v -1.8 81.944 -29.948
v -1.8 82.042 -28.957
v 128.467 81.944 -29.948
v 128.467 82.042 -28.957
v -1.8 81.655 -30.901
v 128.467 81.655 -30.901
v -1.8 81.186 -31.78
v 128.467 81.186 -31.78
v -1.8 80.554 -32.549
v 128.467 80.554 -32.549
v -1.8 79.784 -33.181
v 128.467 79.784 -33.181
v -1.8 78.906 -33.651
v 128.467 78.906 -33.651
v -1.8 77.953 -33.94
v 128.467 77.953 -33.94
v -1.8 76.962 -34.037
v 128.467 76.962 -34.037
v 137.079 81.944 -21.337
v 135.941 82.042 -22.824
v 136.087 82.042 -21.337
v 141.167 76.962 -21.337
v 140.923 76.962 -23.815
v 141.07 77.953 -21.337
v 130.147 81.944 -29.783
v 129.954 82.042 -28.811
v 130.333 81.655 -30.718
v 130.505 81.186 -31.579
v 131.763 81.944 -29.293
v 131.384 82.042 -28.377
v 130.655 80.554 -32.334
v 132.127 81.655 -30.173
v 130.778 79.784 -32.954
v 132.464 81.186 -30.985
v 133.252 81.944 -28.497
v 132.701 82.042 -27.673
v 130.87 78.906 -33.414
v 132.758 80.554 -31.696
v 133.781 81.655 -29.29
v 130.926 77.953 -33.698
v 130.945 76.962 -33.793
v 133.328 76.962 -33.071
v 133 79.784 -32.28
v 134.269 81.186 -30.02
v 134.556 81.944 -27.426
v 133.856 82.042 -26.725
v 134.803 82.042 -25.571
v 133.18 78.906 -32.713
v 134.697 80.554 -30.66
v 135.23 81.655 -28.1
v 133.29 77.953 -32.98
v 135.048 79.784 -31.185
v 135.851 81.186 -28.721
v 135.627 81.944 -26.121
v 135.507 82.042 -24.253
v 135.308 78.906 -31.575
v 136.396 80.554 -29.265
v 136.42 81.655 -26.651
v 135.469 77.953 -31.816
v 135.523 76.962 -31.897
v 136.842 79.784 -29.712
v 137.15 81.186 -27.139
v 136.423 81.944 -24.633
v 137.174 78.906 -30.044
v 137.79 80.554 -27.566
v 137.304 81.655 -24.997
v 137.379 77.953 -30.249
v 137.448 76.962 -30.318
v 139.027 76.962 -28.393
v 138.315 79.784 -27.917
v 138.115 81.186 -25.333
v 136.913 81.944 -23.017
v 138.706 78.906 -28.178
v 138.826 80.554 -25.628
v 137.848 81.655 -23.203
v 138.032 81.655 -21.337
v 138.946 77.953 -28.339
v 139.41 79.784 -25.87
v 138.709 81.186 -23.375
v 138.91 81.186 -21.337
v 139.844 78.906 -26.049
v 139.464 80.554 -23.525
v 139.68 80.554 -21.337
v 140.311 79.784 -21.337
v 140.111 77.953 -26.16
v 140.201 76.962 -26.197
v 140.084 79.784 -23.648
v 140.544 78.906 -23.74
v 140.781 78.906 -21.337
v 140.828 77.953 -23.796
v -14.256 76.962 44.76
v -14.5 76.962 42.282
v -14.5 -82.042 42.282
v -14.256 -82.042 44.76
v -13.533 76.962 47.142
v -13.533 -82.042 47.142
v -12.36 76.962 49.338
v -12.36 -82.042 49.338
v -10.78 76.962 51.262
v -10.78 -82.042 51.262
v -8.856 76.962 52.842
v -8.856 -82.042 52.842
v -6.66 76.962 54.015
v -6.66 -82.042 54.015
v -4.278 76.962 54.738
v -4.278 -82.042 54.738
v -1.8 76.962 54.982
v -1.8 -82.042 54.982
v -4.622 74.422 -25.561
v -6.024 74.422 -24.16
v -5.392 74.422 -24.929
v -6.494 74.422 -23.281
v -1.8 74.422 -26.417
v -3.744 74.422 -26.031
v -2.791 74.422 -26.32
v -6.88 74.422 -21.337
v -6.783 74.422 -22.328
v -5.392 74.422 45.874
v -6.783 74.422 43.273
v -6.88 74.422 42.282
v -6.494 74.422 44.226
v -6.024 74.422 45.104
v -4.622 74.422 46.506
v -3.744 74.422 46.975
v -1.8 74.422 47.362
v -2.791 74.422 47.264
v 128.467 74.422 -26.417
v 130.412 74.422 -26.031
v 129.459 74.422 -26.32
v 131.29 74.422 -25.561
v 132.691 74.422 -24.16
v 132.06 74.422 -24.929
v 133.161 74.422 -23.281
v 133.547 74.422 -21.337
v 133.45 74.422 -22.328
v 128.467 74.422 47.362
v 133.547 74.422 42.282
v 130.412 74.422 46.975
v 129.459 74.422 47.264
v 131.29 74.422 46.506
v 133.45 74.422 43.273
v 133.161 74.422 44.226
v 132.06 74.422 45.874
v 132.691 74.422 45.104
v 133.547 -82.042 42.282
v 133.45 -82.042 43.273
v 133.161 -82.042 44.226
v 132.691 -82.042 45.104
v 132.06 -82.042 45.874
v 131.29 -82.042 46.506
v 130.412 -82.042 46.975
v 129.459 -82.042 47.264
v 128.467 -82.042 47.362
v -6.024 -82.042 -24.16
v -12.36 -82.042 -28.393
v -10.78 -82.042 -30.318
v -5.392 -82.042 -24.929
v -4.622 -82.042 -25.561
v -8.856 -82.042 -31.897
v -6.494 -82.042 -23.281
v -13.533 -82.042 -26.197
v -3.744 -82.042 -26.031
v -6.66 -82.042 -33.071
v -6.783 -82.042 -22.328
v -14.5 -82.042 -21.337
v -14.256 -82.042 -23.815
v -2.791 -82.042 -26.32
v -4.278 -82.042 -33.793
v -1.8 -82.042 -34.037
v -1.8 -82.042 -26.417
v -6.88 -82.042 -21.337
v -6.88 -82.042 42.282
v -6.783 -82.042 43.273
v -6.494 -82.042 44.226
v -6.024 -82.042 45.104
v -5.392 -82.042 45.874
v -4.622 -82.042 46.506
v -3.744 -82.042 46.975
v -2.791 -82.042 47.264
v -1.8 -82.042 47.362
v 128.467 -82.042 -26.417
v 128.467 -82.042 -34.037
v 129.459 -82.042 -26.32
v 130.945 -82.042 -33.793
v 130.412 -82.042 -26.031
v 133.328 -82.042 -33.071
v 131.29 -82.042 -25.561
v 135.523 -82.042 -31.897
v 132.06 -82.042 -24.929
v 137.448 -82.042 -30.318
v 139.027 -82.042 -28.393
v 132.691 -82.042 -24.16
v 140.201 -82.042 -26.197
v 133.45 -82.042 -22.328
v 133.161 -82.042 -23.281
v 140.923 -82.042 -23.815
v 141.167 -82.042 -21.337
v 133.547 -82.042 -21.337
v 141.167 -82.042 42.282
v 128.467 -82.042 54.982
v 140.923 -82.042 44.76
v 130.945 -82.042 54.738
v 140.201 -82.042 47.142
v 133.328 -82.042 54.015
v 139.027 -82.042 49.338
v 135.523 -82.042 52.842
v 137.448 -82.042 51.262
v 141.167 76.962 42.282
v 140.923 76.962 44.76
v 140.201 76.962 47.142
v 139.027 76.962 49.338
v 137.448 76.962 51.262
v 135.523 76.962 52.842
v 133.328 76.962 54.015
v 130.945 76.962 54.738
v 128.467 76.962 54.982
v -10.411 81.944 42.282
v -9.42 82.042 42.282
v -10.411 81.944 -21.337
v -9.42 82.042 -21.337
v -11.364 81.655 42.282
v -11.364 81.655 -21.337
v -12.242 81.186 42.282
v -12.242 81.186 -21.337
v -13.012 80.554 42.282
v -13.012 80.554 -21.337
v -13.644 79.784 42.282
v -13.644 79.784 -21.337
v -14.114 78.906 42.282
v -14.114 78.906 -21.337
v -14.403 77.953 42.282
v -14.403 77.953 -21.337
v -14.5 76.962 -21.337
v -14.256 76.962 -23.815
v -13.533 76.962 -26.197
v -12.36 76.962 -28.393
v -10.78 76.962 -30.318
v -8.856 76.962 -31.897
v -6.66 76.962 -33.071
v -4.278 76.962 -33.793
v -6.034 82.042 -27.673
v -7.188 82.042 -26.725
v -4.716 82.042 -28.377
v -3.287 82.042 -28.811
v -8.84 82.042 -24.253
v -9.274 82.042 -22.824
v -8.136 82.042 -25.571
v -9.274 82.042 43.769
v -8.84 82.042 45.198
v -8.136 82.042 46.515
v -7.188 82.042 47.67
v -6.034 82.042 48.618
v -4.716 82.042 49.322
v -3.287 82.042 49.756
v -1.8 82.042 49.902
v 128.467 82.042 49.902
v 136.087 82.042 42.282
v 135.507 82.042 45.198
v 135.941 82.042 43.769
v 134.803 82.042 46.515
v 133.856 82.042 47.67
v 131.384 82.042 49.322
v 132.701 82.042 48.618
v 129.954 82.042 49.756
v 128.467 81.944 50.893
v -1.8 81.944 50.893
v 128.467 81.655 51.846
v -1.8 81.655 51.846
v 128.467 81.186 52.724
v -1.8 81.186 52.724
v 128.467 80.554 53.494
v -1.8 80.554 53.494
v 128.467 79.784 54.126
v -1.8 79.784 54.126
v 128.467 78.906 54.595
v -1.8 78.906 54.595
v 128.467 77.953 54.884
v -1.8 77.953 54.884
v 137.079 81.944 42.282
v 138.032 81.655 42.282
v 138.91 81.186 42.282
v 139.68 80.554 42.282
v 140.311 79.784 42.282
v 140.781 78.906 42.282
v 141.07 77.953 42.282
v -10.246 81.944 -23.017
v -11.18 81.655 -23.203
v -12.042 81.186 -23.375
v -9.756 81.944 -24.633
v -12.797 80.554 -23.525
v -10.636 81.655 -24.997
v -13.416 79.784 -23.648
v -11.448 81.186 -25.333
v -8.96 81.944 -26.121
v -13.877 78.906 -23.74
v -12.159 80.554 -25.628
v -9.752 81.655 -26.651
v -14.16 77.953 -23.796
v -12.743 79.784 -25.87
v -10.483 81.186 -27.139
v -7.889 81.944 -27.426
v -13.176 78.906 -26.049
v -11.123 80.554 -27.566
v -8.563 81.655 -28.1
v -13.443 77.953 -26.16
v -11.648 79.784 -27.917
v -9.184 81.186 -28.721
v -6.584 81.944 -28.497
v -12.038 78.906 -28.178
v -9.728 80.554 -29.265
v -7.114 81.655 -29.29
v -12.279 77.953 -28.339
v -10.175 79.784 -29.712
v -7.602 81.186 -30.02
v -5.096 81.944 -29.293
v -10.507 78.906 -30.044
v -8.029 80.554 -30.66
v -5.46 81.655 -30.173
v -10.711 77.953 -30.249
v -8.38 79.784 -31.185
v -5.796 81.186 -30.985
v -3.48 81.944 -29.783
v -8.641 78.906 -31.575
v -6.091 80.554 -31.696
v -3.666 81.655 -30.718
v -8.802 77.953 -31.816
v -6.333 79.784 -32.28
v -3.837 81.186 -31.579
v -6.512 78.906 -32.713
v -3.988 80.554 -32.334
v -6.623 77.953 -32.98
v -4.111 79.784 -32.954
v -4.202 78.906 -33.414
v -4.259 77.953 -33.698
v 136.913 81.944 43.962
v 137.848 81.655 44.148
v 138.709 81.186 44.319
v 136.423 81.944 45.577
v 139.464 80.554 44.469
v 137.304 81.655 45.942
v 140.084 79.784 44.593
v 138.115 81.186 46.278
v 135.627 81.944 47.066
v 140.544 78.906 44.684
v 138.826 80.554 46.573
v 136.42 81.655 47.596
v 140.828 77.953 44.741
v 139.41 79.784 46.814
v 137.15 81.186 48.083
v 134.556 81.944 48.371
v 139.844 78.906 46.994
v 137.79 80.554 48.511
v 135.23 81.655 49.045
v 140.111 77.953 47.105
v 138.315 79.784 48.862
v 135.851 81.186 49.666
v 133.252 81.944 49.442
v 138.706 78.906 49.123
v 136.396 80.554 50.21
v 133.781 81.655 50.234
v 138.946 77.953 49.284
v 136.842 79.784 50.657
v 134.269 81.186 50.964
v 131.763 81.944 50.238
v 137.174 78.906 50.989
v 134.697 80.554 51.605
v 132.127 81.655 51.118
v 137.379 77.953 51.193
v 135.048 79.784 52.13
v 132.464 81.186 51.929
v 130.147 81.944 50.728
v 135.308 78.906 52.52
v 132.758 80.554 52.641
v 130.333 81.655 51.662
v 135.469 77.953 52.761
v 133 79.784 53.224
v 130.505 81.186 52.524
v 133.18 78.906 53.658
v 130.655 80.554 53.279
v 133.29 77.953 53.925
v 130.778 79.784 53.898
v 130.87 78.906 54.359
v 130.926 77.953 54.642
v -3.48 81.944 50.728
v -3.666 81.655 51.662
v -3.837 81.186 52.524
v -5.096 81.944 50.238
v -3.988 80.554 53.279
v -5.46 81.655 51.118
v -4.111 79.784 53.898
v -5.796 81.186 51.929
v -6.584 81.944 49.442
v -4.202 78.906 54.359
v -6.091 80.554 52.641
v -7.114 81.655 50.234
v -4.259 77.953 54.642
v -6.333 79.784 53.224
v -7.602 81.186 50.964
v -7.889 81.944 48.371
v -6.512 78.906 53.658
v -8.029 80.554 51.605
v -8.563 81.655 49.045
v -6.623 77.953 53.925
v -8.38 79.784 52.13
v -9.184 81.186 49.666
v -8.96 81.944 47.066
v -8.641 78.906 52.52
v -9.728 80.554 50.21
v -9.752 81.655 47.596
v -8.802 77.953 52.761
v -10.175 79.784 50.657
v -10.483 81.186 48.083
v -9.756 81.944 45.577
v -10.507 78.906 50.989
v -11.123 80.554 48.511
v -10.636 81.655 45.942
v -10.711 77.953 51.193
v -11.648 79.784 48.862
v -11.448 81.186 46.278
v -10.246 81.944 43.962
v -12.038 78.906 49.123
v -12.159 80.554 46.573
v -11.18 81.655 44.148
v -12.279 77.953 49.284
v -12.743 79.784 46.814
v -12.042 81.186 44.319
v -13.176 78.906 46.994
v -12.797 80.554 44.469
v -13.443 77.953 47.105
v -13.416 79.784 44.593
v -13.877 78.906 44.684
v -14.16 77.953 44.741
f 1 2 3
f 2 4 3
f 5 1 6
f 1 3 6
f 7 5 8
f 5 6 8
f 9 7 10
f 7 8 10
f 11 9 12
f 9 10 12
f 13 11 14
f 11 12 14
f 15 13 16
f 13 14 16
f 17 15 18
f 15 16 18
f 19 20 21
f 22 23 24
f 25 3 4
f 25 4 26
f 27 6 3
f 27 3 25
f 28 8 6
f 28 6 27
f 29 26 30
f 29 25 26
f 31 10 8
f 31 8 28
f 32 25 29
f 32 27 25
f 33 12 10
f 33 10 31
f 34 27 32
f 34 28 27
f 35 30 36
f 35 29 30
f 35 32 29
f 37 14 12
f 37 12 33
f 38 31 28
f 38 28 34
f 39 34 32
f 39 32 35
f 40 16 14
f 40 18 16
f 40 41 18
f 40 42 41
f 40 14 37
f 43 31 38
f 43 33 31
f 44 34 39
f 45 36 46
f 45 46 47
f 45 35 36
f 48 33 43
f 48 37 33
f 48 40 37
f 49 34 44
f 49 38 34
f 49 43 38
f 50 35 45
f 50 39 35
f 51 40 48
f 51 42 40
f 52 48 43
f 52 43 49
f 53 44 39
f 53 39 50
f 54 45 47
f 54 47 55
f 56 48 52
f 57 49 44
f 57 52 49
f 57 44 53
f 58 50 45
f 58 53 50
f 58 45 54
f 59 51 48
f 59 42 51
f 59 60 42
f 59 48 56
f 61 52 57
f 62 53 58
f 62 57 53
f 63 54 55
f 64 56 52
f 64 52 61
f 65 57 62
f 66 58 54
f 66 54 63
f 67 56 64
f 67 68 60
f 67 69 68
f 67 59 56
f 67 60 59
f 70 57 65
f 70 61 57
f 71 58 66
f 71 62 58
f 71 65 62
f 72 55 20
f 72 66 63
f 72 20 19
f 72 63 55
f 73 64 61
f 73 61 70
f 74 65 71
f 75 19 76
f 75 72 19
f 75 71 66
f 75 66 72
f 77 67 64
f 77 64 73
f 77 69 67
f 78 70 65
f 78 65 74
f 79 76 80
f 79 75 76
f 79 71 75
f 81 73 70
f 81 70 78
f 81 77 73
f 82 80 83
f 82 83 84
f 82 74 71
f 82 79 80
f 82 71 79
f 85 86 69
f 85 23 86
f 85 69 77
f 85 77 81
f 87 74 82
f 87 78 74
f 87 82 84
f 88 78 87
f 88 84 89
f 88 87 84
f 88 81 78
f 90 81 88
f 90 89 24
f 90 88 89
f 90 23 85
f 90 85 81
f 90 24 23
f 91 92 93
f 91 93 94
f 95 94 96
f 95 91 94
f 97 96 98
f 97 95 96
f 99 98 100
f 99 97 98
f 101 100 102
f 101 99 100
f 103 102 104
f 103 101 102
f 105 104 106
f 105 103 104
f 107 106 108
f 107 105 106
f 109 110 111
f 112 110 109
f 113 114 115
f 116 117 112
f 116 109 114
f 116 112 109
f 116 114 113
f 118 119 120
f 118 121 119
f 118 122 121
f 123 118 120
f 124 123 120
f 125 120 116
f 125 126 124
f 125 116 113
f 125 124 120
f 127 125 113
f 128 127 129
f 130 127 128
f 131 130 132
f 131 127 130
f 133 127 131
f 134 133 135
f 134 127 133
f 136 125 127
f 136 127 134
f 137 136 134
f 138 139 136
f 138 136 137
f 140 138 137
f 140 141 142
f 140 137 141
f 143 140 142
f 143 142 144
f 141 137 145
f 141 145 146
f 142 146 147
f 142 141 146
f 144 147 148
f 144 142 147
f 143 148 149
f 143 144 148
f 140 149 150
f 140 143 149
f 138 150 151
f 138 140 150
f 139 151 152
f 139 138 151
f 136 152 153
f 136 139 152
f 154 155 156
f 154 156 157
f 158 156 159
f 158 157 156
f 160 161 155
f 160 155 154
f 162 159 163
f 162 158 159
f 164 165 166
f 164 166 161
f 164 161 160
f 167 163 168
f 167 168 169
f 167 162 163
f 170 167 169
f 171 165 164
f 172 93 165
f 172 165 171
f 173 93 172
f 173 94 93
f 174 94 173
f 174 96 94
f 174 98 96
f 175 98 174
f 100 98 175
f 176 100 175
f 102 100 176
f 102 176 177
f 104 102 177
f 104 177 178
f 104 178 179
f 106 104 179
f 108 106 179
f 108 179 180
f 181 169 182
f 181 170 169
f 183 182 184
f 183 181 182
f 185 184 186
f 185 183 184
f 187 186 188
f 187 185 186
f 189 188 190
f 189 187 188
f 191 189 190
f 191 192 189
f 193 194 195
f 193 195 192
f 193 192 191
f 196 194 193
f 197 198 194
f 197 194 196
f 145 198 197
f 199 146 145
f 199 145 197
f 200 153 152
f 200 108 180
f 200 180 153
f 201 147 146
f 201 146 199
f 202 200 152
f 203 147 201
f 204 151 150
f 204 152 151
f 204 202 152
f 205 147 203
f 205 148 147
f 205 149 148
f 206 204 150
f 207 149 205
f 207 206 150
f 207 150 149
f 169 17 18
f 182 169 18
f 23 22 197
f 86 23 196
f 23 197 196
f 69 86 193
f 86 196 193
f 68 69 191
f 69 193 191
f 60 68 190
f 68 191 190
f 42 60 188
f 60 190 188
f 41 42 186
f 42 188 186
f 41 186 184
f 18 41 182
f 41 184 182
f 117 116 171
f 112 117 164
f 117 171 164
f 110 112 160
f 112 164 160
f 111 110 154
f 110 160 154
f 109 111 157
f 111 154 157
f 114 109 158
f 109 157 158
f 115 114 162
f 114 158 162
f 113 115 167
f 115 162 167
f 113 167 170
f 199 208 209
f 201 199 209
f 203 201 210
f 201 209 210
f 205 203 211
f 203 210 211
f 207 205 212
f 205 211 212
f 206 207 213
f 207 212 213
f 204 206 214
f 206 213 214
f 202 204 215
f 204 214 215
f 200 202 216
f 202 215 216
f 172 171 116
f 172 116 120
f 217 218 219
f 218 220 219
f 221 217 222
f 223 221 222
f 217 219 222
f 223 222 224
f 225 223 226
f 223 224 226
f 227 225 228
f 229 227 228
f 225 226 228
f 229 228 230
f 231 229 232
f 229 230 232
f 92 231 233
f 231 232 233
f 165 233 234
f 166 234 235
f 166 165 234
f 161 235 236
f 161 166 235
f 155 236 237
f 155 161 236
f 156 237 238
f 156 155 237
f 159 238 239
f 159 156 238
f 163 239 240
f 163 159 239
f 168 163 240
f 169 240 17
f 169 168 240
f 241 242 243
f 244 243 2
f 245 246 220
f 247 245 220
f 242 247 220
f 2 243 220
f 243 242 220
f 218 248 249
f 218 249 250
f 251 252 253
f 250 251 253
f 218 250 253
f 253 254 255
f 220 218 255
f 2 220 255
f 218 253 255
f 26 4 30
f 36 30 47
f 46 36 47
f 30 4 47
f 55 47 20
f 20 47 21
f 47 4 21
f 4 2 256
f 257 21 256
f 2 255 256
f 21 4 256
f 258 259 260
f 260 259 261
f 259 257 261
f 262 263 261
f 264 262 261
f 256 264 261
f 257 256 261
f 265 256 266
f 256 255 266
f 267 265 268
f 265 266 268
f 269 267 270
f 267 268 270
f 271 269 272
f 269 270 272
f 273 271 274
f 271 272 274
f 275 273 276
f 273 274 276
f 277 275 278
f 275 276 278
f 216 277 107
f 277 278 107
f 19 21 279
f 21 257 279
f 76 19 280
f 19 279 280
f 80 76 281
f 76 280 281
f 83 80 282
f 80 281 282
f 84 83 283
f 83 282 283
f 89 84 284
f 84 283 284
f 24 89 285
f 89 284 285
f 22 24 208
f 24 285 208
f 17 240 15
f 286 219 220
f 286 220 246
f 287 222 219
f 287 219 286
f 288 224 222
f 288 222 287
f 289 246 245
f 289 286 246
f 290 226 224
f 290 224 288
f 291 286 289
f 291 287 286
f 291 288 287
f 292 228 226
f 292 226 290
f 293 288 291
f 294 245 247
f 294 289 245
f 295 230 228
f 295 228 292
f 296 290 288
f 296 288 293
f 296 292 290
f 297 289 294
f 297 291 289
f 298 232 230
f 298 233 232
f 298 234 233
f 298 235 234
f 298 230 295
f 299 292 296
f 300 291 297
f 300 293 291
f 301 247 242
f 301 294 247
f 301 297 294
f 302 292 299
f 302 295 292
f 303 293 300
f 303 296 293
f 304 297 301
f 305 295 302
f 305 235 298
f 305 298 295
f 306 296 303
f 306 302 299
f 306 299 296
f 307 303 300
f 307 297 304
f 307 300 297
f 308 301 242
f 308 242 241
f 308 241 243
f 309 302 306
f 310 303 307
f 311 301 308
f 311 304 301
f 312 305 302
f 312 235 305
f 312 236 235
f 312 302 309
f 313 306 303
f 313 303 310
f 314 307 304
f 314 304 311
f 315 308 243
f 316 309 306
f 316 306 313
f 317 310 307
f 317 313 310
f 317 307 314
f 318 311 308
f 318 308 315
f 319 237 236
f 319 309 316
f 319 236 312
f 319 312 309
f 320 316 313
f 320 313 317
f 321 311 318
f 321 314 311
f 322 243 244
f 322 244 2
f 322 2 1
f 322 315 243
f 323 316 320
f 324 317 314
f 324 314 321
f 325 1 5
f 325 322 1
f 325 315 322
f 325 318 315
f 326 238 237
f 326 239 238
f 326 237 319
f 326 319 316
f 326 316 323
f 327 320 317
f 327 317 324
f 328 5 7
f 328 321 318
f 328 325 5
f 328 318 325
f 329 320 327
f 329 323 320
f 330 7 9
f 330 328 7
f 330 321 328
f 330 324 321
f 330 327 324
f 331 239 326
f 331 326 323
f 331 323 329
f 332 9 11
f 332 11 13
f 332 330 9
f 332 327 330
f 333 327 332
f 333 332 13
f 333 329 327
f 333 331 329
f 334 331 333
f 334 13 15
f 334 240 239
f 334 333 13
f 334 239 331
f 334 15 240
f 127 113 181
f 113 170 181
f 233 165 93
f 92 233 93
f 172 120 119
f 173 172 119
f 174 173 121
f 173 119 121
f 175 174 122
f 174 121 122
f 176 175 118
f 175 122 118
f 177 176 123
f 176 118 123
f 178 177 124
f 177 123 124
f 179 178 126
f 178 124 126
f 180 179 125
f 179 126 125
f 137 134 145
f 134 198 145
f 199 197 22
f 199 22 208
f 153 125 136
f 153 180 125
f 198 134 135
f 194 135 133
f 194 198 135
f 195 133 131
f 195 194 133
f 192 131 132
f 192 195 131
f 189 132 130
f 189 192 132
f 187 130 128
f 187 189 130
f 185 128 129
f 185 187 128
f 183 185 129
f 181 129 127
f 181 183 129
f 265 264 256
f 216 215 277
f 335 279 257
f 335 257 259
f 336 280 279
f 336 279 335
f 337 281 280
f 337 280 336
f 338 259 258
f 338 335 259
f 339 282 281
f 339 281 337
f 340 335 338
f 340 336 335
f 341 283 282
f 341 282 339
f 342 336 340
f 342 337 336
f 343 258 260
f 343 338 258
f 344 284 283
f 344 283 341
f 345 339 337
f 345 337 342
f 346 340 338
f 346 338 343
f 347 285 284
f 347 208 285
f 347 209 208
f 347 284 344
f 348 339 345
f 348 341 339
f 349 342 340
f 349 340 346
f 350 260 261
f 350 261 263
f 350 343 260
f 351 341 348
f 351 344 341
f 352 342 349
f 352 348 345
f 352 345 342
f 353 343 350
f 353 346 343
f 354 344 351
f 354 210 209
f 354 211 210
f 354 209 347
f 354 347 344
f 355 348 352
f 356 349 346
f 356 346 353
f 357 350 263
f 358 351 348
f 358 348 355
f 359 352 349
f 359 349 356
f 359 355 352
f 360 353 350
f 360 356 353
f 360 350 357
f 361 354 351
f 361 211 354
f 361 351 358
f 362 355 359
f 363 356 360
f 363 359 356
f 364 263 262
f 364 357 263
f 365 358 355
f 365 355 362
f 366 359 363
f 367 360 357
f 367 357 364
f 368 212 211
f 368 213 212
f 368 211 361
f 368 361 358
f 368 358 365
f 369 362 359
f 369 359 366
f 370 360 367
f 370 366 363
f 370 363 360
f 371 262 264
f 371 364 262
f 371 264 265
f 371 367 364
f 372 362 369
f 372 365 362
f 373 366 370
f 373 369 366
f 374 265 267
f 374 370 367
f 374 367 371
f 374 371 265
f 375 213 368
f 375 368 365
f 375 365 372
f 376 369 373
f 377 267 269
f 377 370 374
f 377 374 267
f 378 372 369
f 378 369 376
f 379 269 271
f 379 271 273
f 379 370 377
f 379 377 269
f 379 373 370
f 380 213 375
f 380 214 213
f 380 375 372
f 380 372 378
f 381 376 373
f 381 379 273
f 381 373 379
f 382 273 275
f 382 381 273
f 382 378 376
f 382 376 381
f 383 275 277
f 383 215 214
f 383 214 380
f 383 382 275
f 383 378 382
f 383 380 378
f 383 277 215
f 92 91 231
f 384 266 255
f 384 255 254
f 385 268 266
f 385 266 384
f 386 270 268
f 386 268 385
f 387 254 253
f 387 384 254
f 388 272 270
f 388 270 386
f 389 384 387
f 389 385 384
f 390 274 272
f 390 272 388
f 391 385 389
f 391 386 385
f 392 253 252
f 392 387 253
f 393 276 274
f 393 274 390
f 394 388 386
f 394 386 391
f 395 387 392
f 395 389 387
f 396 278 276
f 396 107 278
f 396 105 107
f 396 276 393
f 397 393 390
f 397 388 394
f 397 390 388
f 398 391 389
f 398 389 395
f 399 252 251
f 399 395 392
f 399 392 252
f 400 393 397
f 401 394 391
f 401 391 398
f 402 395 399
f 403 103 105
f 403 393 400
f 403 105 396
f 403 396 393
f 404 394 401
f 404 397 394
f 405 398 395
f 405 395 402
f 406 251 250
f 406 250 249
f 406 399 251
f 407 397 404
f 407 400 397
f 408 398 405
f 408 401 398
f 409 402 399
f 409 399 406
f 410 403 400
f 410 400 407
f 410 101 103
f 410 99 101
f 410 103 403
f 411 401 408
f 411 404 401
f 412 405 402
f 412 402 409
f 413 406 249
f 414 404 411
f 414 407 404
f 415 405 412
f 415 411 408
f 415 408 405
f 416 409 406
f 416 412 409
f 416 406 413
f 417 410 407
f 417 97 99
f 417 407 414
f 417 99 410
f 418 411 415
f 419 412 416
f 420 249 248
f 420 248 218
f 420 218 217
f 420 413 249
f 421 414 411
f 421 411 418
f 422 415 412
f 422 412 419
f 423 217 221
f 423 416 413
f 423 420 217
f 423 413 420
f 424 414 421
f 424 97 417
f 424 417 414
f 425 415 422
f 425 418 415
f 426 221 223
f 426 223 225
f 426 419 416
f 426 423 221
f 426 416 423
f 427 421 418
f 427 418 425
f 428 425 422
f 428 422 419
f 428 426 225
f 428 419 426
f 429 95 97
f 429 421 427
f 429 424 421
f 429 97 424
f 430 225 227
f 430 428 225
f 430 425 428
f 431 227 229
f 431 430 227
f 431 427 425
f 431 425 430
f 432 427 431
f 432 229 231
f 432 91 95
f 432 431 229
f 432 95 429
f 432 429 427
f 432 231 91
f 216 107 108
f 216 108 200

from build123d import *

# Parameters (mm, degrees)
F0_W     = 155.6676864983
F0_H     = 89.0193315694
F1_DEPTH = 82.042
F2_R     = 12.7
F3_R     = 5.08
F4_T     = -7.62


with BuildPart() as f1:
    # F0 (on Front) → F1 (new body, symmetric)
    with BuildSketch(Plane.XZ):
        with Locations((63.3336471573, 10.4723514293)):
            Rectangle(F0_W, F0_H)
    extrude(amount=F1_DEPTH, both=True)

    # F2
    f2_edges = [f1.edges().sort_by_distance(p)[0] for p in [
        (-14.500196, 0, 54.982017),
        (-14.500196, 0, -34.037314),
        (141.16749, 0, 54.982017),
        (141.16749, 0, -34.037314),
    ]]
    fillet(f2_edges, radius=F2_R)

    # F3
    f3_edges = [f1.edges().sort_by_distance(p)[0] for p in [
        (-10.780452, 82.042, -30.31757),
    ]]
    fillet(f3_edges, radius=F3_R)

    # F4
    f4_openings = [f1.faces().sort_by_distance(p)[0] for p in [
        (63.333647, -82.042, 10.472351),
    ]]
    offset(amount=F4_T, openings=f4_openings)


solid = f1.part
